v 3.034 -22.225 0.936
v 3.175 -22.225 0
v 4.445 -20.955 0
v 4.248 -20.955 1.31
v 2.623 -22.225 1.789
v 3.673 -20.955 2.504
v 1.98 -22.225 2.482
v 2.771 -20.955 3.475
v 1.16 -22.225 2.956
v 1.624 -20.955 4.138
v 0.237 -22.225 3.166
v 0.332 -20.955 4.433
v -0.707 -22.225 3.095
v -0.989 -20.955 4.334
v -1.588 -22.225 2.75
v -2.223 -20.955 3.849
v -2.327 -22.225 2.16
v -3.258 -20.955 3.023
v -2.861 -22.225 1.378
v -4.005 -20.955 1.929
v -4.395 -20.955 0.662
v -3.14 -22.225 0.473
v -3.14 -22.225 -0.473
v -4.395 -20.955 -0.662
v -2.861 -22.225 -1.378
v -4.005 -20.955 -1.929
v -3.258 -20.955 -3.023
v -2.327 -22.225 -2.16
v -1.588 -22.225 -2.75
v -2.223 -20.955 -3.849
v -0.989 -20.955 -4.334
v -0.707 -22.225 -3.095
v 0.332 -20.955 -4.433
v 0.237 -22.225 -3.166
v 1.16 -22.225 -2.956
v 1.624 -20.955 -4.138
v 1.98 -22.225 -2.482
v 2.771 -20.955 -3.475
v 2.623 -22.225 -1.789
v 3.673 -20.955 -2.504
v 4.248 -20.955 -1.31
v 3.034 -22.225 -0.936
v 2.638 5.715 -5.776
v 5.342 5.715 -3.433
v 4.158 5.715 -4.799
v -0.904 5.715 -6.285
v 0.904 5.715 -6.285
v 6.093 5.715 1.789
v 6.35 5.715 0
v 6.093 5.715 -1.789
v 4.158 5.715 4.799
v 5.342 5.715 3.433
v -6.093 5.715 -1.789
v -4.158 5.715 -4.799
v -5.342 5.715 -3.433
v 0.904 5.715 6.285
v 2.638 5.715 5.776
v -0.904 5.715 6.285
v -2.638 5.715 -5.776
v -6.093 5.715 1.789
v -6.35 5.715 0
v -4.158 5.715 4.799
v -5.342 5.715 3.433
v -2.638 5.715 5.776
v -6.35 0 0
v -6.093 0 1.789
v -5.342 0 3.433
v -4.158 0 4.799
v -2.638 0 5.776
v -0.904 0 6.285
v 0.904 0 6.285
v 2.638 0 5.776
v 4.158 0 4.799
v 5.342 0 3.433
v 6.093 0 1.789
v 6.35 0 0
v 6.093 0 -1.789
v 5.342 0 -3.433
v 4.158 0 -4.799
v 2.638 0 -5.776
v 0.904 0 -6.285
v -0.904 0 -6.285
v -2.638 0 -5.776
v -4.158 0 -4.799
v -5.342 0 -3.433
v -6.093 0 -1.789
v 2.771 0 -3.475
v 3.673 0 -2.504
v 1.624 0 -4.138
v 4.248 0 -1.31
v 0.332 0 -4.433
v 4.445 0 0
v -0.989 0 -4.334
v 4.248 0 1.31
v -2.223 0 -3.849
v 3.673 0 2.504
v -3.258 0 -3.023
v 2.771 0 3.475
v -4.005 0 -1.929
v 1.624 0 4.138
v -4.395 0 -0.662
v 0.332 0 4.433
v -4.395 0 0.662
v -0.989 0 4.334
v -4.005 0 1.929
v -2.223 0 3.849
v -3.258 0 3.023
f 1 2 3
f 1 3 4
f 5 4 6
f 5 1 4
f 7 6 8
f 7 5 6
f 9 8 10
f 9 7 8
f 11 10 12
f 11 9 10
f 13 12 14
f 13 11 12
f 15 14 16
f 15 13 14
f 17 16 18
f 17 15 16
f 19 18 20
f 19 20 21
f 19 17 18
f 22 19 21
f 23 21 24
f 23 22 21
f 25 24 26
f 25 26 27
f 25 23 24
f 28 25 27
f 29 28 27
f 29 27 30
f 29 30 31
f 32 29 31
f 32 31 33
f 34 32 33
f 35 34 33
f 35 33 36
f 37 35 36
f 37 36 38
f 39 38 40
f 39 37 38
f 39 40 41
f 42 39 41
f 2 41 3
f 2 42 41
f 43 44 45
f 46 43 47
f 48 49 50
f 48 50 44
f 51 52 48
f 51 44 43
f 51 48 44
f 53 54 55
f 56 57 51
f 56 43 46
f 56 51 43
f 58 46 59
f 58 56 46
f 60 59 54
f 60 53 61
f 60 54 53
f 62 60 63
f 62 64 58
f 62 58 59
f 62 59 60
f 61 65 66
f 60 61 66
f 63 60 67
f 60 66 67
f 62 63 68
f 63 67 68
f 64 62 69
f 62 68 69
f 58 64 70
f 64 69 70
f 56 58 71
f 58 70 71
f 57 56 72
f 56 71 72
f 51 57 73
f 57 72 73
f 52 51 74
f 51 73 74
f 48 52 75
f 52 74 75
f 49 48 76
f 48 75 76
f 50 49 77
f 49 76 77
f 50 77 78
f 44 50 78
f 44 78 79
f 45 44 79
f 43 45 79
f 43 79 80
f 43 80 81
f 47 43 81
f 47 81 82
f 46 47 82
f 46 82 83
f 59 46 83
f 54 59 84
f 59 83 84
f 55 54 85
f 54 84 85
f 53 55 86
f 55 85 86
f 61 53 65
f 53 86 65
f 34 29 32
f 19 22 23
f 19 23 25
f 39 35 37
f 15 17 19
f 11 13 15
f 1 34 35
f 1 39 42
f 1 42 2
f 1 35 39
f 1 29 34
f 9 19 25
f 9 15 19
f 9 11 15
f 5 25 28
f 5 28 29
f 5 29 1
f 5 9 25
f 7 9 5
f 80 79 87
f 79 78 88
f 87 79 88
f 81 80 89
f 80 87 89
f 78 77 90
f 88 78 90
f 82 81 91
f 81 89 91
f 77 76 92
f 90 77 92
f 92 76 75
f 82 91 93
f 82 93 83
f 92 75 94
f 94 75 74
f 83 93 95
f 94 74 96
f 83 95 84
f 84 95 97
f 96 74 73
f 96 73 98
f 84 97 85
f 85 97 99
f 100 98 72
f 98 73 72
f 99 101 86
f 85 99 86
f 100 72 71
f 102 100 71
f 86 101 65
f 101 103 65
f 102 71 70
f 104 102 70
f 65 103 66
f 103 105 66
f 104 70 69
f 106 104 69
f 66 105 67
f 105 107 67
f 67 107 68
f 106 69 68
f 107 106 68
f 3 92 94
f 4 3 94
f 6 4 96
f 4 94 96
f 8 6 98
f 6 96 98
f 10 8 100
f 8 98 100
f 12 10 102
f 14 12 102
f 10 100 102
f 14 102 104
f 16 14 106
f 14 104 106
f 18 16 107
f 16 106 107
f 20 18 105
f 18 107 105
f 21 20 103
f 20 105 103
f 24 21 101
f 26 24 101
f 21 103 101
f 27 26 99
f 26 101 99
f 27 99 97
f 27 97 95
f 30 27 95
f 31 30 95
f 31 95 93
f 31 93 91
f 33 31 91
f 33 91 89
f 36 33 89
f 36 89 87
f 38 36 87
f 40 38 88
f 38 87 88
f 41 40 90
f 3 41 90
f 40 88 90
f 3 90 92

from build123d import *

# Parameters (mm, degrees)
F0_R     = 4.445
F1_DEPTH = 22.225
F2_R     = 6.35
F2_R_2   = 4.445
F3_DEPTH = 5.715
F4_SIZE  = 1.27


with BuildPart() as f1:
    # F0 (on Front) → F1 (new body)
    with BuildSketch(Plane.XZ):
        Circle(F0_R)
    extrude(amount=F1_DEPTH)

    # F2 (on face) → F3 (join)
    with BuildSketch(Plane(origin=(0, 0, 0), x_dir=(-1, 0, 0), z_dir=(0, 1, 0))):
        Circle(F2_R)
        Circle(F2_R_2, mode=Mode.SUBTRACT)
        Circle(F2_R_2)
    extrude(amount=F3_DEPTH)

    # F4
    f4_edges = [f1.edges().sort_by_distance(p)[0] for p in [
        (-4.445, -22.225, 0),
    ]]
    chamfer(f4_edges, length=F4_SIZE)


solid = f1.part
